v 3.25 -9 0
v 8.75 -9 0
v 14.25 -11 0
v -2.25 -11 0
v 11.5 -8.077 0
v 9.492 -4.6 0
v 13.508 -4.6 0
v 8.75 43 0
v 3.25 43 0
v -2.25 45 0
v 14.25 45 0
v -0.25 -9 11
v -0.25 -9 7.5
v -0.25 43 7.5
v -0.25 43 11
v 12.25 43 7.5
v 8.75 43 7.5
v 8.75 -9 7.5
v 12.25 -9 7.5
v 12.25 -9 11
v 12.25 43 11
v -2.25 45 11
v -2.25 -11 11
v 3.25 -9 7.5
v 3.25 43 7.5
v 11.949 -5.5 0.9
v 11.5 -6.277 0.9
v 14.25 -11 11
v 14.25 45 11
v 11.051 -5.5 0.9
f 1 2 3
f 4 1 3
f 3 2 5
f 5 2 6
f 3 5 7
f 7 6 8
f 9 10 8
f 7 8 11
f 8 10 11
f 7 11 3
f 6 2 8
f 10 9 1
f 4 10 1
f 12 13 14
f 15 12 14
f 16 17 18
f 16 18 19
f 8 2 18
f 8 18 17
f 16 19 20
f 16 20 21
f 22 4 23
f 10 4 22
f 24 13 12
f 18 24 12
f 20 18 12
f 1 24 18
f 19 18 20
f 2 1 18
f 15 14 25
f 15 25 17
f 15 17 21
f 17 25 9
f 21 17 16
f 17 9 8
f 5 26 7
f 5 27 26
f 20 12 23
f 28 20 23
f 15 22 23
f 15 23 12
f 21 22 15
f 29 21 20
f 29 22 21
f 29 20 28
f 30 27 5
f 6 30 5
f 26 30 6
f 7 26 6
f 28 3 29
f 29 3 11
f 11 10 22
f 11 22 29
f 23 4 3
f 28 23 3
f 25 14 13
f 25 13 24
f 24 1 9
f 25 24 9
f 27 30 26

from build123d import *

# Parameters (mm, degrees)
BOX022_W                   = 5.5
BOX022_H                   = 52
BOX022_DEPTH               = 8
PAD010_DEPTH               = 1.1
CHAMFER002_SIZE            = 1
CHAMFER002_PLACEMENT_ANGLE = 180
BOX021_W                   = 12.5
BOX021_H                   = 52
BOX021_DEPTH               = 4
BOX020_W                   = 16.5
BOX020_H                   = 56
BOX020_DEPTH               = 11


with BuildPart() as cube022:
    # Box022 → Box022 (new body)
    with BuildSketch(Plane(origin=(3.25, -9, -0.5), x_dir=(1, 0, 0), z_dir=(0, 0, 1))):
        with Locations((2.75, 26)):
            Rectangle(BOX022_W, BOX022_H)
    extrude(amount=BOX022_DEPTH)


with BuildPart() as chamfer002:
    # Sketch013 → Pad010 (new body)
    with BuildSketch(Plane.XY):
        Polygon((0, 20.777284), (-2.180816, 17), (2.180816, 17), align=None)
    extrude(amount=PAD010_DEPTH)

    # Chamfer002
    chamfer002_edges = [chamfer002.edges().sort_by_distance(p)[0] for p in [
        (-1.090408, 18.888642, 0),
        (0, 17, 0),
        (1.090408, 18.888642, 0),
    ]]
    chamfer(chamfer002_edges, length=CHAMFER002_SIZE)


with BuildPart() as chamfer002_1:
    # Chamfer002 placement: moved
    add(chamfer002.part.moved(Location((11.5, 12.5, 0.9))).rotate(Axis((11.5, 12.5, 0.9), (1, 0, 0)), CHAMFER002_PLACEMENT_ANGLE))


with BuildPart() as fusion012:
    # Box021 → Box021 (new body)
    with BuildSketch(Plane(origin=(-0.25, -9, 7.5), x_dir=(1, 0, 0), z_dir=(0, 0, 1))):
        with Locations((6.25, 26)):
            Rectangle(BOX021_W, BOX021_H)
    extrude(amount=BOX021_DEPTH)

    # Fusion012: union Cube022, Chamfer002
    add(cube022.part)
    add(chamfer002_1.part)


with BuildPart() as rasplightconninner:
    # Box020 → Box020 (new body)
    with BuildSketch(Plane(origin=(-2.25, -11, 0), x_dir=(1, 0, 0), z_dir=(0, 0, 1))):
        with Locations((8.25, 28)):
            Rectangle(BOX020_W, BOX020_H)
    extrude(amount=BOX020_DEPTH)

    # Cut023: cut Fusion012
    add(fusion012.part, mode=Mode.SUBTRACT)


solid = rasplightconninner.part
